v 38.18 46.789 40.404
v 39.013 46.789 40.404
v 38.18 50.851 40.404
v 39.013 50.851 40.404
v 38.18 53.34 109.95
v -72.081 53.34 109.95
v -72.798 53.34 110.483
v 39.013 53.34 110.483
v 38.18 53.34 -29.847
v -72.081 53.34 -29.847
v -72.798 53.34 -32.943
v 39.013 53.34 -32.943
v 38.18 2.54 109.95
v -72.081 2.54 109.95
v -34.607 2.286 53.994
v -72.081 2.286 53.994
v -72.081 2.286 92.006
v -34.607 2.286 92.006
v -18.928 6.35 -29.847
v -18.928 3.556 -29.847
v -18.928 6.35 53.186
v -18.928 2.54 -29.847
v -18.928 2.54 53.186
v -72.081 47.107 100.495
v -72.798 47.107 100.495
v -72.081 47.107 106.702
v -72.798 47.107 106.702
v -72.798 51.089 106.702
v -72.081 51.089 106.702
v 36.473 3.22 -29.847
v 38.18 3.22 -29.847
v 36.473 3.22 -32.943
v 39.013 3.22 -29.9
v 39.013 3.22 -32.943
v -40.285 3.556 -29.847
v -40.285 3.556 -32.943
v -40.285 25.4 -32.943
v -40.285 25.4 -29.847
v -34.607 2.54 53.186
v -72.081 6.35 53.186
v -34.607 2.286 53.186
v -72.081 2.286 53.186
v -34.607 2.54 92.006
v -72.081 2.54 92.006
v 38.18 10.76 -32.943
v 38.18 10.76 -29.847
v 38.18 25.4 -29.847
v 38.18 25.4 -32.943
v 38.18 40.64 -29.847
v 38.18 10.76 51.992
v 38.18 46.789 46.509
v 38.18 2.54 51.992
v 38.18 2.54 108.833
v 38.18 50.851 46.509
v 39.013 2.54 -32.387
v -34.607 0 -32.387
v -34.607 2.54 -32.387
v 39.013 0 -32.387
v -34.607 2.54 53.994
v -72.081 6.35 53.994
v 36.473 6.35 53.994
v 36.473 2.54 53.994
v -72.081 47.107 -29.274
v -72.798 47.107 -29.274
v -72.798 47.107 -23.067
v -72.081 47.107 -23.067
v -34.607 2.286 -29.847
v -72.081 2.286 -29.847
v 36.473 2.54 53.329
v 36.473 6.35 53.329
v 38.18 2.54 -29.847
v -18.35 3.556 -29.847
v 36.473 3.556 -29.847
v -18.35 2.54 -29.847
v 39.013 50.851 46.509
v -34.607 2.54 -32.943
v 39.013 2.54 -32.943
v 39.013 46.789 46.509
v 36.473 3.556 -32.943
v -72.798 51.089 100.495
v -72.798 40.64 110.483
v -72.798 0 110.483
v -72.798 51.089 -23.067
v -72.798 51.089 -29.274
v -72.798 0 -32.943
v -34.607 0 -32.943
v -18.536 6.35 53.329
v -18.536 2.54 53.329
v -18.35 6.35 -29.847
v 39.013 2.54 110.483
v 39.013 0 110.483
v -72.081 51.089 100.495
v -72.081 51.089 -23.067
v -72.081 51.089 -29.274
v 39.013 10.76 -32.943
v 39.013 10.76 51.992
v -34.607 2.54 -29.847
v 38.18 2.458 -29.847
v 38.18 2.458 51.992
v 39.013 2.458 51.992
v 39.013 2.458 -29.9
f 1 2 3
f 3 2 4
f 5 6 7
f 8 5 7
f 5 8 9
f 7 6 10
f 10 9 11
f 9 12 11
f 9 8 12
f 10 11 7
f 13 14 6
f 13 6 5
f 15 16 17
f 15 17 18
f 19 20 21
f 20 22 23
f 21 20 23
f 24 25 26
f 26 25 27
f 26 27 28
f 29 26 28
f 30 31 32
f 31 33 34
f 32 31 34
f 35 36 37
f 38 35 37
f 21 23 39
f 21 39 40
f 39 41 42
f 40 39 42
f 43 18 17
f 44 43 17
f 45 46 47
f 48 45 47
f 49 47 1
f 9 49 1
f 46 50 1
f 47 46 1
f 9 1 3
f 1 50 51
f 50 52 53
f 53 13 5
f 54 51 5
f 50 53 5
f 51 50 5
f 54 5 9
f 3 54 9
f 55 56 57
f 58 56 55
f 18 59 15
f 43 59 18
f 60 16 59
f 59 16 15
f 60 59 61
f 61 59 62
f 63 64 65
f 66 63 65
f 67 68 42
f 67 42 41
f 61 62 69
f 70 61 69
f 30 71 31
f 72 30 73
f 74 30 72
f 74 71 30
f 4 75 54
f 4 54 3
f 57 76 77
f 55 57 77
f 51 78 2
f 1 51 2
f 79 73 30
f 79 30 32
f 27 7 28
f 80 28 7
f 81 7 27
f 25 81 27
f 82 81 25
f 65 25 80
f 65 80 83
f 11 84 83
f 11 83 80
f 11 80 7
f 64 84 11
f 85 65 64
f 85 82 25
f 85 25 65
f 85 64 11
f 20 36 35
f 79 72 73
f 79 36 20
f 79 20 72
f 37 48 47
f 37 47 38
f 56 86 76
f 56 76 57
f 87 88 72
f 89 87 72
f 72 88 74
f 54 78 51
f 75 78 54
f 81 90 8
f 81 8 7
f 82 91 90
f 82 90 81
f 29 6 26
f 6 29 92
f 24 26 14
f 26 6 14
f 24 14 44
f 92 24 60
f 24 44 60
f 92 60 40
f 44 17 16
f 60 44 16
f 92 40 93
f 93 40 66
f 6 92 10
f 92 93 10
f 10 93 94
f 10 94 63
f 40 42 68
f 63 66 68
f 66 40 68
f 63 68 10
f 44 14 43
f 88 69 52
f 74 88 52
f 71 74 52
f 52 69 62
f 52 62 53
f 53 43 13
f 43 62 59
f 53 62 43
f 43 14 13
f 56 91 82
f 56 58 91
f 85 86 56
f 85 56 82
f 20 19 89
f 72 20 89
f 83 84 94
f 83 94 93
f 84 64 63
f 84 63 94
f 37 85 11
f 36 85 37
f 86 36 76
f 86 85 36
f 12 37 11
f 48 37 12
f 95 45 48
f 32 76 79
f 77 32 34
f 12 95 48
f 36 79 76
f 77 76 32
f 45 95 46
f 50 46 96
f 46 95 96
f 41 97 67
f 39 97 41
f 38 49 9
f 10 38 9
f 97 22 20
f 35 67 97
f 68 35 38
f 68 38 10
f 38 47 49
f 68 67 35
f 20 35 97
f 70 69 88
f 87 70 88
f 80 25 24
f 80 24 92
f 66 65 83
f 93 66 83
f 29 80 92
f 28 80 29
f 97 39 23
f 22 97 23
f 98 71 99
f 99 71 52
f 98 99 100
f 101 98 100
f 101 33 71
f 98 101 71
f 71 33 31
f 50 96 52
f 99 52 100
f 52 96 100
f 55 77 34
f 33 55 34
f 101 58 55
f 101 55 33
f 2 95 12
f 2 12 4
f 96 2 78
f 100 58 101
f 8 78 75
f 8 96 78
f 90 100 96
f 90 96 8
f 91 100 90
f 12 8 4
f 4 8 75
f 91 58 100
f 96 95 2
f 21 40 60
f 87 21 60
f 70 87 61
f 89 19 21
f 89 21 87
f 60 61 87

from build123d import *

# Parameters (mm, degrees)
SKETCH1_W            = 76.15972441
SKETCH1_H            = 126.932874018
BOSS_EXTRUDE1_DEPTH  = 2.54
BOSS_EXTRUDE4_DEPTH  = 38.1
SHELL1_T             = -2.54
BOSS_EXTRUDE5_DEPTH  = 6.35
SKETCH16_W           = 76.15972441
SKETCH16_H           = 40.64
CUT_EXTRUDE7_DEPTH   = 7.112
SKETCH17_W           = 71.07972441
SKETCH17_H           = 3.09636258
CUT_EXTRUDE8_DEPTH   = 4.064
SKETCH19_W           = 35.651407884
SKETCH19_H           = 127.489236598
BOSS_EXTRUDE19_DEPTH = 2.286
SKETCH26_W           = 127.489236598
SKETCH26_H           = 38.354
CUT_EXTRUDE10_DEPTH  = 2.54
BOSS_EXTRUDE20_DEPTH = 40.64
SKETCH28_W           = 111.811132294
SKETCH28_H           = 15.936917459
BOSS_EXTRUDE21_DEPTH = 2.54
SKETCH34_W           = 111.811132294
SKETCH34_H           = 38.1
CUT_EXTRUDE12_DEPTH  = 5.08
BOSS_EXTRUDE23_DEPTH = 40.64
BOSS_EXTRUDE24_DEPTH = 6.35
BOSS_EXTRUDE28_DEPTH = 12.7
BOSS_EXTRUDE29_DEPTH = 27.94
SKETCH54_W           = 6.207163676
SKETCH54_H           = 3.981954056
CUT_EXTRUDE20_DEPTH  = 15.24
SKETCH55_W           = 6.104333468
SKETCH55_H           = 4.061705803
CUT_EXTRUDE21_DEPTH  = 15.24
SKETCH56_W           = 1.706619681
SKETCH56_H           = 138.67981609
CUT_EXTRUDE22_DEPTH  = 38.1
SKETCH57_W           = 5.678434708
SKETCH57_H           = 21.844
CUT_EXTRUDE23_DEPTH  = 38.1
CUT_EXTRUDE24_DEPTH  = 2.54
SKETCH59_W           = 110.26035724
SKETCH59_H           = 1.116448274
CUT_EXTRUDE25_DEPTH  = 38.1
SKETCH61_W           = 1.706619681
SKETCH61_H           = 14.640018444
CUT_EXTRUDE26_DEPTH  = 4.064
CUT_EXTRUDE28_DEPTH  = 0.762


with BuildPart() as part:
    # Sketch1 → Boss-Extrude1 (new body)
    with BuildSketch(Plane(origin=(0, 0, 0), x_dir=(1, 0, 0), z_dir=(0, 1, 0))):
        with Locations((0.933329956, -31.079887535)):
            Rectangle(SKETCH1_W, SKETCH1_H)
    extrude(amount=BOSS_EXTRUDE1_DEPTH)

    # Sketch7 → Boss-Extrude4 (add)
    with BuildSketch(Plane(origin=(0, 2.54, 0), x_dir=(1, 0, 0), z_dir=(0, 1, 0))):
        Polygon((-37.146532249, 32.386549474), (-37.146532249, -94.546324544), (39.013192161, -94.546324544), (39.013192161, 32.386549474), (39.013192161, 37.514912054), (-37.146532249, 37.514912054), align=None)
    extrude(amount=BOSS_EXTRUDE4_DEPTH)

    # Shell1
    shell1_openings = [part.faces().sort_by_distance(p)[0] for p in [
        (0.933329956, 40.64, 28.515706245),
    ]]
    offset(amount=SHELL1_T, openings=shell1_openings, kind=Kind.INTERSECTION)

    # Sketch12 → Boss-Extrude5 (add)
    with BuildSketch(Plane(origin=(0, 0, 0), x_dir=(1, 0, 0), z_dir=(0, 1, 0))):
        Polygon((-17.752421588, -53.993703886), (39.013192161, -53.993703886), (39.013192161, -53.328667969), (-17.752421588, -53.328667969), (-18.535651553, -53.328667969), (-18.344689589, 32.386549474), (-18.927981394, 32.386549474), (-18.927981394, -53.993703886), (-18.28148375, -53.993703886), align=None)
    extrude(amount=BOSS_EXTRUDE5_DEPTH)

    # Sketch16 → Cut-Extrude7 (cut)
    with BuildSketch(Plane(origin=(0, 0, -40.054912054), x_dir=(-1, 0, 0), z_dir=(0, 0, -1))):
        with Locations((-0.933329956, 20.32)):
            Rectangle(SKETCH16_W, SKETCH16_H)
    extrude(amount=-CUT_EXTRUDE7_DEPTH, mode=Mode.SUBTRACT)

    # Sketch17 → Cut-Extrude8 (cut)
    with BuildSketch(Plane(origin=(0, 7.62, 0), x_dir=(1, 0, 0), z_dir=(0, 1, 0))):
        with Locations((0.933329956, 31.394730764)):
            Rectangle(SKETCH17_W, SKETCH17_H)
    extrude(amount=-CUT_EXTRUDE8_DEPTH, mode=Mode.SUBTRACT)

    # Sketch19 → Boss-Extrude19 (add)
    with BuildSketch(Plane(origin=(0, 0, 0), x_dir=(1, 0, 0), z_dir=(0, 1, 0))):
        with Locations((-54.972236191, -30.801706245)):
            Rectangle(SKETCH19_W, SKETCH19_H)
    extrude(amount=BOSS_EXTRUDE19_DEPTH)

    # Sketch26 → Cut-Extrude10 (cut)
    with BuildSketch(Plane.ZY.offset(37.146532249)):
        with Locations((30.801706245, 21.463)):
            Rectangle(SKETCH26_W, SKETCH26_H)
    extrude(amount=-CUT_EXTRUDE10_DEPTH, mode=Mode.SUBTRACT)

    # Sketch27 → Boss-Extrude20 (add)
    with BuildSketch(Plane(origin=(0, 0, 0), x_dir=(1, 0, 0), z_dir=(0, 1, 0))):
        Polygon((-34.606532249, -94.546324544), (-72.797940133, -94.546324544), (-72.797940133, 32.942912054), (-34.606532249, 32.942912054), (-34.606532249, 29.846549474), (-72.080545398, 29.846549474), (-72.080545398, -92.006324544), (-70.104362866, -92.006324544), (-34.606532249, -92.006324544), align=None)
    extrude(amount=BOSS_EXTRUDE20_DEPTH)

    # Sketch28 → Boss-Extrude21 (add)
    with BuildSketch(Plane(origin=(0, 0, 0), x_dir=(1, 0, 0), z_dir=(0, 1, 0))):
        with Locations((-16.892373986, -102.514783274)):
            Rectangle(SKETCH28_W, SKETCH28_H)
    extrude(amount=BOSS_EXTRUDE21_DEPTH)

    # Sketch34 → Cut-Extrude12 (cut)
    with BuildSketch(Plane.XY.offset(97.086324544)):
        with Locations((-16.892373986, 21.59)):
            Rectangle(SKETCH34_W, SKETCH34_H)
    extrude(amount=-CUT_EXTRUDE12_DEPTH, mode=Mode.SUBTRACT)

    # Sketch36 → Boss-Extrude23 (add)
    with BuildSketch(Plane(origin=(0, 0, 0), x_dir=(1, 0, 0), z_dir=(0, 1, 0))):
        Polygon((-72.797940133, -92.006324544), (-72.797940133, -110.483242003), (39.013192161, -110.483242003), (39.013192161, -92.006324544), (36.473192161, -92.006324544), (36.473192161, -108.833266616), (-72.080545398, -108.833266616), (-72.080545398, -92.006324544), align=None)
    extrude(amount=BOSS_EXTRUDE23_DEPTH)

    # Sketch39 → Boss-Extrude24 (add)
    with BuildSketch(Plane(origin=(0, 0, 0), x_dir=(1, 0, 0), z_dir=(0, 1, 0))):
        Polygon((-19.575673417, -53.993703886), (-72.080545398, -53.993703886), (-72.080545398, -53.1861939), (-19.575673417, -53.1861939), (-18.927981394, -53.1861939), (-18.927981394, -53.993703886), align=None)
    extrude(amount=BOSS_EXTRUDE24_DEPTH)

    # Sketch51 → Boss-Extrude28 (add)
    with BuildSketch(Plane(origin=(0, 40.64, 0), x_dir=(1, 0, 0), z_dir=(0, 1, 0))):
        Polygon((-34.606532249, 32.942912054), (-34.606532249, 29.846549474), (-72.080545398, 29.846549474), (-72.080545398, -108.833266616), (-72.080545398, -109.553098124), (-72.080545398, -109.94971489), (38.179811842, -109.94971489), (38.179811842, -109.553098124), (38.179811842, 32.942912054), (39.013192161, 32.942912054), (39.013192161, -110.483242003), (-72.797940133, -110.483242003), (-72.797940133, 32.942912054), align=None)
    extrude(amount=BOSS_EXTRUDE28_DEPTH)

    # Sketch52 → Boss-Extrude29 (add)
    with BuildSketch(Plane(origin=(0, 53.34, 0), x_dir=(1, 0, 0), z_dir=(0, 1, 0))):
        Polygon((38.179811842, 32.942912054), (38.179811842, 29.846549474), (-34.606532249, 29.846549474), (-39.725324066, 29.846549474), (-39.725324066, 32.942912054), (-34.606532249, 32.942912054), align=None)
    extrude(amount=-BOSS_EXTRUDE29_DEPTH)

    # Sketch54 → Cut-Extrude20 (cut)
    with BuildSketch(Plane.ZY.offset(72.797940133)):
        with Locations((103.598874165, 49.097770639)):
            Rectangle(SKETCH54_W, SKETCH54_H)
        with Locations((-26.170821026, 49.097770639)):
            Rectangle(SKETCH54_W, SKETCH54_H)
    extrude(amount=-CUT_EXTRUDE20_DEPTH, mode=Mode.SUBTRACT)

    # Sketch55 → Cut-Extrude21 (cut)
    with BuildSketch(Plane(origin=(41.553192161, 0, 0), x_dir=(0, 0, -1), z_dir=(1, 0, 0))):
        with Locations((-43.456564529, 48.820045114)):
            Rectangle(SKETCH55_W, SKETCH55_H)
    extrude(amount=-CUT_EXTRUDE21_DEPTH, mode=Mode.SUBTRACT)

    # Sketch56 → Cut-Extrude22 (cut)
    with BuildSketch(Plane(origin=(0, 40.64, 0), x_dir=(1, 0, 0), z_dir=(0, 1, 0))):
        with Locations((37.326502002, -39.493358571)):
            Rectangle(SKETCH56_W, SKETCH56_H)
    extrude(amount=-CUT_EXTRUDE22_DEPTH, mode=Mode.SUBTRACT)

    # Sketch57 → Cut-Extrude23 (cut)
    with BuildSketch(Plane(origin=(0, 0, -32.942912054), x_dir=(-1, 0, 0), z_dir=(0, 0, -1))):
        with Locations((37.445749603, 14.478)):
            Rectangle(SKETCH57_W, SKETCH57_H)
    extrude(amount=-CUT_EXTRUDE23_DEPTH, mode=Mode.SUBTRACT)

    # Sketch58 → Cut-Extrude24 (cut)
    with BuildSketch(Plane(origin=(39.013192161, 0, 0), x_dir=(0, 0, -1), z_dir=(1, 0, 0))):
        Polygon((-51.99249987, 3.220445107), (32.386549474, 3.220445107), (32.942912054, 3.220445107), (32.942912054, 3.900890214), (32.942912054, 10.759981556), (-51.99249987, 10.759981556), align=None)
    extrude(amount=-CUT_EXTRUDE24_DEPTH, mode=Mode.SUBTRACT)

    # Sketch59 → Cut-Extrude25 (cut)
    with BuildSketch(Plane(origin=(0, 40.64, 0), x_dir=(1, 0, 0), z_dir=(0, 1, 0))):
        with Locations((-16.950366778, -109.391490753)):
            Rectangle(SKETCH59_W, SKETCH59_H)
    extrude(amount=-CUT_EXTRUDE25_DEPTH, mode=Mode.SUBTRACT)

    # Sketch61 → Cut-Extrude26 (cut)
    with BuildSketch(Plane.XY.offset(-29.846549474)):
        with Locations((37.326502002, 18.079990778)):
            Rectangle(SKETCH61_W, SKETCH61_H)
    extrude(amount=-CUT_EXTRUDE26_DEPTH, mode=Mode.SUBTRACT)

    # Sketch62 → Cut-Extrude28 (cut)
    with BuildSketch(Plane(origin=(0, 3.220445107, 0), x_dir=(1, 0, 0), z_dir=(0, 1, 0))):
        Polygon((38.179811842, -51.99249987), (39.013192161, -51.99249987), (39.013192161, 29.899968422), (38.179811842, 29.846549474), align=None)
    extrude(amount=-CUT_EXTRUDE28_DEPTH, mode=Mode.SUBTRACT)


solid = part.part
